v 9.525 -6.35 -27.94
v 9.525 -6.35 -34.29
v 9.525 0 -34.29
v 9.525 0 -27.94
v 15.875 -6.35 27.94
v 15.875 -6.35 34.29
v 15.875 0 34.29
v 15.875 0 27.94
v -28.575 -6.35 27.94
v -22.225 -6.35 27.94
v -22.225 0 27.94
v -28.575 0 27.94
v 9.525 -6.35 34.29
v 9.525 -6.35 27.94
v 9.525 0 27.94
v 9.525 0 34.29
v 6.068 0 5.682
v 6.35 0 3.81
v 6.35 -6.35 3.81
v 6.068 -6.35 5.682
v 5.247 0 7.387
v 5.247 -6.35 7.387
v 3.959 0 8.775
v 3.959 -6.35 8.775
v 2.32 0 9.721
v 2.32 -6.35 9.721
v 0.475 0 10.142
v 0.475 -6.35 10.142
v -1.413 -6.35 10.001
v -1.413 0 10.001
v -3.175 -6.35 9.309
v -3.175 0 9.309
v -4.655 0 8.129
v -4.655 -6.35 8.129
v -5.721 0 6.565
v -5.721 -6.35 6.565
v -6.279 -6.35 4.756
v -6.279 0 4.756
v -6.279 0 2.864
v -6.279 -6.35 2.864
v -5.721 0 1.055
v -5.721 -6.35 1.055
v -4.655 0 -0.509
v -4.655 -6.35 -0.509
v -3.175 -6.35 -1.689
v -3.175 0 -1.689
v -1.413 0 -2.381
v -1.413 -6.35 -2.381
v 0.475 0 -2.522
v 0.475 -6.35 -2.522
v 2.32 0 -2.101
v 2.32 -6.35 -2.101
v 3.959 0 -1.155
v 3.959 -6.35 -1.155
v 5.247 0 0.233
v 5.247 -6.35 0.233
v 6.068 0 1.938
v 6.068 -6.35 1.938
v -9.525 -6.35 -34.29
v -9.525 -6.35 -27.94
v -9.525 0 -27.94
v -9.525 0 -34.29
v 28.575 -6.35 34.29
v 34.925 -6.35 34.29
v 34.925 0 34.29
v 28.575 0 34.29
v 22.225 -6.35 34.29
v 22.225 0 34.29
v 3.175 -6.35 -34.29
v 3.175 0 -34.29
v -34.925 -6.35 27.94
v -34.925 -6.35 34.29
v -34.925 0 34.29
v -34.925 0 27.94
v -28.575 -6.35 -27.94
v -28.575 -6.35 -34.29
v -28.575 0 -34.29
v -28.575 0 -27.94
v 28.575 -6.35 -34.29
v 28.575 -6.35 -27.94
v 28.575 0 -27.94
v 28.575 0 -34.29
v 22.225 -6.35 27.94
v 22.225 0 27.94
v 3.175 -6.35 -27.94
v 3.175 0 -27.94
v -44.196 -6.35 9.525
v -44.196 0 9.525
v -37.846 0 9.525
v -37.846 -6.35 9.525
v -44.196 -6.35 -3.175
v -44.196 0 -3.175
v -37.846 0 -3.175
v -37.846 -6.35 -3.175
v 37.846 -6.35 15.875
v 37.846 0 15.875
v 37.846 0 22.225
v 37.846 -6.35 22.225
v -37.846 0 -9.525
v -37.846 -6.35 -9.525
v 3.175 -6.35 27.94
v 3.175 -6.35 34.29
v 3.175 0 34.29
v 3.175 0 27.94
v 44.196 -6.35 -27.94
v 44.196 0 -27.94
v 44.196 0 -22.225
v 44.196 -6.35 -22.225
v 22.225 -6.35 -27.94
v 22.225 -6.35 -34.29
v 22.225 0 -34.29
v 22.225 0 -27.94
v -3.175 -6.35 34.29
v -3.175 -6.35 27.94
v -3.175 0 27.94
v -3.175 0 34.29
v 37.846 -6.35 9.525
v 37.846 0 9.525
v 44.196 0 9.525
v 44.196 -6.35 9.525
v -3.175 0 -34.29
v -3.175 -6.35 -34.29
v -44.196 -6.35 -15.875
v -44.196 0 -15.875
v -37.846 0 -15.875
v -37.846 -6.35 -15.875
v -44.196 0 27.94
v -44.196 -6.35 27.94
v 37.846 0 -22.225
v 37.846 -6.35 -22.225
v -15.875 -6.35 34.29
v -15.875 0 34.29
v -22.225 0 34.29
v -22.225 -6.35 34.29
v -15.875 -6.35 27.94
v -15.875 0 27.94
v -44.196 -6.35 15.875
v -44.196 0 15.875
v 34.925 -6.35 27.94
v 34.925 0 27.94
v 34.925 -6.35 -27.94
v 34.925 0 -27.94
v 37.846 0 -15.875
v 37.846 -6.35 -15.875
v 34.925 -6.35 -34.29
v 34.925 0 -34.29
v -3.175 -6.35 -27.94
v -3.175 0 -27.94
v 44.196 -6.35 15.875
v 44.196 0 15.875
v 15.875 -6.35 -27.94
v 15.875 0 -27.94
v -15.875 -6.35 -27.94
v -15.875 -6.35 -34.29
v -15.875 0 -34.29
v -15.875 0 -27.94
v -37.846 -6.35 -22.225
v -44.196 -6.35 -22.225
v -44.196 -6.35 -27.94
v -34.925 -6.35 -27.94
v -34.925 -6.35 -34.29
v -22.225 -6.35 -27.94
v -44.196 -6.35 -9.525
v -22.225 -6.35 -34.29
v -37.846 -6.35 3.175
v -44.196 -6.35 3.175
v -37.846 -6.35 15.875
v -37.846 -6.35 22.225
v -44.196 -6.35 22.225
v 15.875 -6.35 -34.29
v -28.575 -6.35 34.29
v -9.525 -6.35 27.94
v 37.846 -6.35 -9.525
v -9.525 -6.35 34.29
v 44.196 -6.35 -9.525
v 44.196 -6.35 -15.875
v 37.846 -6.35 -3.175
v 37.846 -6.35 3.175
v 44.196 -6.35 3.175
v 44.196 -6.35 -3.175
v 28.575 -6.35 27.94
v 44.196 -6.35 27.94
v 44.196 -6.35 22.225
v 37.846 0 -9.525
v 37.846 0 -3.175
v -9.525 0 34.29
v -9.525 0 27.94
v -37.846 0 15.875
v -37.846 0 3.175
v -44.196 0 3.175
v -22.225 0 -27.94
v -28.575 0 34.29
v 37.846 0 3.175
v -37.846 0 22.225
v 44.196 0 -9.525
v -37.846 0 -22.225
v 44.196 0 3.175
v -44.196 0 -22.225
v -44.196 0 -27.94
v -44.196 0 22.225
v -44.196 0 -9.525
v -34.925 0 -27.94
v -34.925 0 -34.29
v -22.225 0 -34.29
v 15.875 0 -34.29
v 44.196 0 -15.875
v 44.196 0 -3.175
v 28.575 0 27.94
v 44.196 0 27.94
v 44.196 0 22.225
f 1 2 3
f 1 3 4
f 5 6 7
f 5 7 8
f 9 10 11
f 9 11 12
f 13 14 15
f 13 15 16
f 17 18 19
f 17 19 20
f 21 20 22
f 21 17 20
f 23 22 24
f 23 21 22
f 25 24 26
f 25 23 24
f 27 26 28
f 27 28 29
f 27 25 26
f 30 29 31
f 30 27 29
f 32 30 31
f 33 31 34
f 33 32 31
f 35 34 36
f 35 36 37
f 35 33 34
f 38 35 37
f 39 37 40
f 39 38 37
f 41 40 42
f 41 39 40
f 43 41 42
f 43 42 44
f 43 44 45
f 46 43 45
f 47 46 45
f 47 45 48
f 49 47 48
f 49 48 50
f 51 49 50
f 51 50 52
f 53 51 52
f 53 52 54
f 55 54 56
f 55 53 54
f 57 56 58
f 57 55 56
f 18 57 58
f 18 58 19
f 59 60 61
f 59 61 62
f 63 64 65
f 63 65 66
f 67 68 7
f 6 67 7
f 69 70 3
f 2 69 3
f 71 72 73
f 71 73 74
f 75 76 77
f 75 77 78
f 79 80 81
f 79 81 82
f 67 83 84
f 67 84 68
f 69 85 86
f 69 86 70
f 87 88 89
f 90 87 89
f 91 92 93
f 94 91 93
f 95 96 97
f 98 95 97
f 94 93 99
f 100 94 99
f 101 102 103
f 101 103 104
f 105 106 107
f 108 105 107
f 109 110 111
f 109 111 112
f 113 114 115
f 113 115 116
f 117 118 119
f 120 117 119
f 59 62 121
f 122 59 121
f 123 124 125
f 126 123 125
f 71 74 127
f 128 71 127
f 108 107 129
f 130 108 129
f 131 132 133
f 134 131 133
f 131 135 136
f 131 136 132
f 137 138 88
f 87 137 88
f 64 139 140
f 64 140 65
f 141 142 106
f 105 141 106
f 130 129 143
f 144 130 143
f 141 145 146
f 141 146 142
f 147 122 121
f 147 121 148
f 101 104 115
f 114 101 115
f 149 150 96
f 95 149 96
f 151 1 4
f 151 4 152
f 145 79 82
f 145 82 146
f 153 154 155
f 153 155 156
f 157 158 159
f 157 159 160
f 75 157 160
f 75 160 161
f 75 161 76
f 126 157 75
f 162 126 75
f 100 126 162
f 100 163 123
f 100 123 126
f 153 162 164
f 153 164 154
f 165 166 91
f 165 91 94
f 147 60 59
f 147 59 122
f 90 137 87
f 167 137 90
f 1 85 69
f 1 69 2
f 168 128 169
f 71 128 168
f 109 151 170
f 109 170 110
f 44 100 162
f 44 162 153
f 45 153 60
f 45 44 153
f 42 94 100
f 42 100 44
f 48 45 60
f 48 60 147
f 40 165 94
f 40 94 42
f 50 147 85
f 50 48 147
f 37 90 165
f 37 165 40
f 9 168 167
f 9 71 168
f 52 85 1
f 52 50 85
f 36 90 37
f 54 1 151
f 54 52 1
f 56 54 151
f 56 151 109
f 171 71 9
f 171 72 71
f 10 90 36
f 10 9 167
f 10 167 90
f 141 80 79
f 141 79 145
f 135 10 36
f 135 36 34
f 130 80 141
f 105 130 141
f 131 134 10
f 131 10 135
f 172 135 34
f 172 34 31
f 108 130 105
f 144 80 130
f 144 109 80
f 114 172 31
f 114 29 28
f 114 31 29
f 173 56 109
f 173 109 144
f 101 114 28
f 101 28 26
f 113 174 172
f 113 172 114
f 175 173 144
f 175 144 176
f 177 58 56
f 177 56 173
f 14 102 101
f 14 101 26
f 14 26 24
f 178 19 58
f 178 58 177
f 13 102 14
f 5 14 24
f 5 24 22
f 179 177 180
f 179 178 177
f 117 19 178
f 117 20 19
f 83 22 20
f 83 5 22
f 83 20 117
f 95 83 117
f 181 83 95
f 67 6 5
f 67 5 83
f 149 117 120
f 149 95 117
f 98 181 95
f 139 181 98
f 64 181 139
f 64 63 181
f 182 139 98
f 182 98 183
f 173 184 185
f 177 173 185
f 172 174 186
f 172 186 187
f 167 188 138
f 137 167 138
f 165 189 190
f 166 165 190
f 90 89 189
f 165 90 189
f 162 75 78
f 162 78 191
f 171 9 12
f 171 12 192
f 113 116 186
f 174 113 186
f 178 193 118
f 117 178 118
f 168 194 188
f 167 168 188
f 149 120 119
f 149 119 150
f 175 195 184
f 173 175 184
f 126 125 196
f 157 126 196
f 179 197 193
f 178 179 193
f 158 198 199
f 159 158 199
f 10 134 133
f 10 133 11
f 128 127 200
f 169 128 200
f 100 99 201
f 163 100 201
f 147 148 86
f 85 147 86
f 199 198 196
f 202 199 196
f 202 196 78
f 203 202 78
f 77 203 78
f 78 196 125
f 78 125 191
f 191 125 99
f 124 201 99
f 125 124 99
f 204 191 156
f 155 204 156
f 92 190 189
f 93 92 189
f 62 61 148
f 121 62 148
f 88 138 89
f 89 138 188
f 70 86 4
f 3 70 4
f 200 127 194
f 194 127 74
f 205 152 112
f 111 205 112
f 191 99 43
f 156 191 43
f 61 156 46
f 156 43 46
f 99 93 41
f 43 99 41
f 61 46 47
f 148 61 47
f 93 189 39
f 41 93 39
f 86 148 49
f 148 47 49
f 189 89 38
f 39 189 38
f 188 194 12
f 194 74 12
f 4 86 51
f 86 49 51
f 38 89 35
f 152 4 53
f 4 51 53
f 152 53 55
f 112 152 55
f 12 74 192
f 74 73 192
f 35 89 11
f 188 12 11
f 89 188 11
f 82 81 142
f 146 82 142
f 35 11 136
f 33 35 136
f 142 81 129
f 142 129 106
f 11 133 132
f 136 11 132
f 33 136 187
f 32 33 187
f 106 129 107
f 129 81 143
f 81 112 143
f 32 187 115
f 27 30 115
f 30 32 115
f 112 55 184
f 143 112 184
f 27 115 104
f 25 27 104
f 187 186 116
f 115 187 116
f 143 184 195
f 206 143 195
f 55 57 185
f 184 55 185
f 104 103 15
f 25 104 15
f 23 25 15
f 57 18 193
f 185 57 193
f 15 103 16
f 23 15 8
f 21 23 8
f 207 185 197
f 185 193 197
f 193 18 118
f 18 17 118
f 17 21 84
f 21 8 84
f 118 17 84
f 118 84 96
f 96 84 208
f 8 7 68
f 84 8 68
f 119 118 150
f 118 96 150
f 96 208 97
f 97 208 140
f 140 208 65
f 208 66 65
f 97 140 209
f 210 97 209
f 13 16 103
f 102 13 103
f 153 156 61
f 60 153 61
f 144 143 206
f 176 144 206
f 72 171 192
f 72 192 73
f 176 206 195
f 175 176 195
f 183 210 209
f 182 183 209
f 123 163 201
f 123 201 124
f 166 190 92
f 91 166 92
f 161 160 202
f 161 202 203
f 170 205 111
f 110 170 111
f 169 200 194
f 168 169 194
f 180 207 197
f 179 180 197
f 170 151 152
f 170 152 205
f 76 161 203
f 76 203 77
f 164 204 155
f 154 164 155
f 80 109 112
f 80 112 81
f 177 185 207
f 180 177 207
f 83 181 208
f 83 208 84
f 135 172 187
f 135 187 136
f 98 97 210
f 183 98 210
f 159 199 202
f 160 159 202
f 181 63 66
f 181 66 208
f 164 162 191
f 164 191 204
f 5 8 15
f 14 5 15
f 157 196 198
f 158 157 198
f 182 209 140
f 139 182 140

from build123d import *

# Parameters (mm, degrees)
F0_R     = 6.35
F1_DEPTH = 6.35


with BuildPart() as f1:
    # F0 (on Front) → F1 (new body)
    with BuildSketch(Plane.XZ):
        Polygon((44.196, 27.94), (37.846, 27.94), (34.925, 27.94), (34.925, 34.29), (28.575, 34.29), (28.575, 27.94), (22.225, 27.94), (22.225, 34.29), (15.875, 34.29), (15.875, 27.94), (9.525, 27.94), (9.525, 34.29), (3.175, 34.29), (3.175, 27.94), (-3.175, 27.94), (-3.175, 34.29), (-9.525, 34.29), (-9.525, 27.94), (-15.875, 27.94), (-15.875, 34.29), (-22.225, 34.29), (-22.225, 27.94), (-28.575, 27.94), (-28.575, 34.29), (-34.925, 34.29), (-34.925, 27.94), (-37.846, 27.94), (-44.196, 27.94), (-44.196, 22.225), (-37.846, 22.225), (-37.846, 15.875), (-44.196, 15.875), (-44.196, 9.525), (-37.846, 9.525), (-37.846, 3.175), (-44.196, 3.175), (-44.196, -3.175), (-37.846, -3.175), (-37.846, -9.525), (-44.196, -9.525), (-44.196, -15.875), (-37.846, -15.875), (-37.846, -22.225), (-44.196, -22.225), (-44.196, -27.94), (-37.846, -27.94), (-34.925, -27.94), (-34.925, -34.29), (-28.575, -34.29), (-28.575, -27.94), (-22.225, -27.94), (-22.225, -34.29), (-15.875, -34.29), (-15.875, -27.94), (-9.525, -27.94), (-9.525, -34.29), (-3.175, -34.29), (-3.175, -27.94), (3.175, -27.94), (3.175, -34.29), (9.525, -34.29), (9.525, -27.94), (15.875, -27.94), (15.875, -34.29), (22.225, -34.29), (22.225, -27.94), (28.575, -27.94), (28.575, -34.29), (34.925, -34.29), (34.925, -27.94), (37.846, -27.94), (44.196, -27.94), (44.196, -22.225), (37.846, -22.225), (37.846, -15.875), (44.196, -15.875), (44.196, -9.525), (37.846, -9.525), (37.846, -3.175), (44.196, -3.175), (44.196, 3.175), (37.846, 3.175), (37.846, 9.525), (44.196, 9.525), (44.196, 15.875), (37.846, 15.875), (37.846, 22.225), (44.196, 22.225), align=None)
        with Locations((0, 3.81)):
            Circle(F0_R, mode=Mode.SUBTRACT)
    extrude(amount=F1_DEPTH)


solid = f1.part
